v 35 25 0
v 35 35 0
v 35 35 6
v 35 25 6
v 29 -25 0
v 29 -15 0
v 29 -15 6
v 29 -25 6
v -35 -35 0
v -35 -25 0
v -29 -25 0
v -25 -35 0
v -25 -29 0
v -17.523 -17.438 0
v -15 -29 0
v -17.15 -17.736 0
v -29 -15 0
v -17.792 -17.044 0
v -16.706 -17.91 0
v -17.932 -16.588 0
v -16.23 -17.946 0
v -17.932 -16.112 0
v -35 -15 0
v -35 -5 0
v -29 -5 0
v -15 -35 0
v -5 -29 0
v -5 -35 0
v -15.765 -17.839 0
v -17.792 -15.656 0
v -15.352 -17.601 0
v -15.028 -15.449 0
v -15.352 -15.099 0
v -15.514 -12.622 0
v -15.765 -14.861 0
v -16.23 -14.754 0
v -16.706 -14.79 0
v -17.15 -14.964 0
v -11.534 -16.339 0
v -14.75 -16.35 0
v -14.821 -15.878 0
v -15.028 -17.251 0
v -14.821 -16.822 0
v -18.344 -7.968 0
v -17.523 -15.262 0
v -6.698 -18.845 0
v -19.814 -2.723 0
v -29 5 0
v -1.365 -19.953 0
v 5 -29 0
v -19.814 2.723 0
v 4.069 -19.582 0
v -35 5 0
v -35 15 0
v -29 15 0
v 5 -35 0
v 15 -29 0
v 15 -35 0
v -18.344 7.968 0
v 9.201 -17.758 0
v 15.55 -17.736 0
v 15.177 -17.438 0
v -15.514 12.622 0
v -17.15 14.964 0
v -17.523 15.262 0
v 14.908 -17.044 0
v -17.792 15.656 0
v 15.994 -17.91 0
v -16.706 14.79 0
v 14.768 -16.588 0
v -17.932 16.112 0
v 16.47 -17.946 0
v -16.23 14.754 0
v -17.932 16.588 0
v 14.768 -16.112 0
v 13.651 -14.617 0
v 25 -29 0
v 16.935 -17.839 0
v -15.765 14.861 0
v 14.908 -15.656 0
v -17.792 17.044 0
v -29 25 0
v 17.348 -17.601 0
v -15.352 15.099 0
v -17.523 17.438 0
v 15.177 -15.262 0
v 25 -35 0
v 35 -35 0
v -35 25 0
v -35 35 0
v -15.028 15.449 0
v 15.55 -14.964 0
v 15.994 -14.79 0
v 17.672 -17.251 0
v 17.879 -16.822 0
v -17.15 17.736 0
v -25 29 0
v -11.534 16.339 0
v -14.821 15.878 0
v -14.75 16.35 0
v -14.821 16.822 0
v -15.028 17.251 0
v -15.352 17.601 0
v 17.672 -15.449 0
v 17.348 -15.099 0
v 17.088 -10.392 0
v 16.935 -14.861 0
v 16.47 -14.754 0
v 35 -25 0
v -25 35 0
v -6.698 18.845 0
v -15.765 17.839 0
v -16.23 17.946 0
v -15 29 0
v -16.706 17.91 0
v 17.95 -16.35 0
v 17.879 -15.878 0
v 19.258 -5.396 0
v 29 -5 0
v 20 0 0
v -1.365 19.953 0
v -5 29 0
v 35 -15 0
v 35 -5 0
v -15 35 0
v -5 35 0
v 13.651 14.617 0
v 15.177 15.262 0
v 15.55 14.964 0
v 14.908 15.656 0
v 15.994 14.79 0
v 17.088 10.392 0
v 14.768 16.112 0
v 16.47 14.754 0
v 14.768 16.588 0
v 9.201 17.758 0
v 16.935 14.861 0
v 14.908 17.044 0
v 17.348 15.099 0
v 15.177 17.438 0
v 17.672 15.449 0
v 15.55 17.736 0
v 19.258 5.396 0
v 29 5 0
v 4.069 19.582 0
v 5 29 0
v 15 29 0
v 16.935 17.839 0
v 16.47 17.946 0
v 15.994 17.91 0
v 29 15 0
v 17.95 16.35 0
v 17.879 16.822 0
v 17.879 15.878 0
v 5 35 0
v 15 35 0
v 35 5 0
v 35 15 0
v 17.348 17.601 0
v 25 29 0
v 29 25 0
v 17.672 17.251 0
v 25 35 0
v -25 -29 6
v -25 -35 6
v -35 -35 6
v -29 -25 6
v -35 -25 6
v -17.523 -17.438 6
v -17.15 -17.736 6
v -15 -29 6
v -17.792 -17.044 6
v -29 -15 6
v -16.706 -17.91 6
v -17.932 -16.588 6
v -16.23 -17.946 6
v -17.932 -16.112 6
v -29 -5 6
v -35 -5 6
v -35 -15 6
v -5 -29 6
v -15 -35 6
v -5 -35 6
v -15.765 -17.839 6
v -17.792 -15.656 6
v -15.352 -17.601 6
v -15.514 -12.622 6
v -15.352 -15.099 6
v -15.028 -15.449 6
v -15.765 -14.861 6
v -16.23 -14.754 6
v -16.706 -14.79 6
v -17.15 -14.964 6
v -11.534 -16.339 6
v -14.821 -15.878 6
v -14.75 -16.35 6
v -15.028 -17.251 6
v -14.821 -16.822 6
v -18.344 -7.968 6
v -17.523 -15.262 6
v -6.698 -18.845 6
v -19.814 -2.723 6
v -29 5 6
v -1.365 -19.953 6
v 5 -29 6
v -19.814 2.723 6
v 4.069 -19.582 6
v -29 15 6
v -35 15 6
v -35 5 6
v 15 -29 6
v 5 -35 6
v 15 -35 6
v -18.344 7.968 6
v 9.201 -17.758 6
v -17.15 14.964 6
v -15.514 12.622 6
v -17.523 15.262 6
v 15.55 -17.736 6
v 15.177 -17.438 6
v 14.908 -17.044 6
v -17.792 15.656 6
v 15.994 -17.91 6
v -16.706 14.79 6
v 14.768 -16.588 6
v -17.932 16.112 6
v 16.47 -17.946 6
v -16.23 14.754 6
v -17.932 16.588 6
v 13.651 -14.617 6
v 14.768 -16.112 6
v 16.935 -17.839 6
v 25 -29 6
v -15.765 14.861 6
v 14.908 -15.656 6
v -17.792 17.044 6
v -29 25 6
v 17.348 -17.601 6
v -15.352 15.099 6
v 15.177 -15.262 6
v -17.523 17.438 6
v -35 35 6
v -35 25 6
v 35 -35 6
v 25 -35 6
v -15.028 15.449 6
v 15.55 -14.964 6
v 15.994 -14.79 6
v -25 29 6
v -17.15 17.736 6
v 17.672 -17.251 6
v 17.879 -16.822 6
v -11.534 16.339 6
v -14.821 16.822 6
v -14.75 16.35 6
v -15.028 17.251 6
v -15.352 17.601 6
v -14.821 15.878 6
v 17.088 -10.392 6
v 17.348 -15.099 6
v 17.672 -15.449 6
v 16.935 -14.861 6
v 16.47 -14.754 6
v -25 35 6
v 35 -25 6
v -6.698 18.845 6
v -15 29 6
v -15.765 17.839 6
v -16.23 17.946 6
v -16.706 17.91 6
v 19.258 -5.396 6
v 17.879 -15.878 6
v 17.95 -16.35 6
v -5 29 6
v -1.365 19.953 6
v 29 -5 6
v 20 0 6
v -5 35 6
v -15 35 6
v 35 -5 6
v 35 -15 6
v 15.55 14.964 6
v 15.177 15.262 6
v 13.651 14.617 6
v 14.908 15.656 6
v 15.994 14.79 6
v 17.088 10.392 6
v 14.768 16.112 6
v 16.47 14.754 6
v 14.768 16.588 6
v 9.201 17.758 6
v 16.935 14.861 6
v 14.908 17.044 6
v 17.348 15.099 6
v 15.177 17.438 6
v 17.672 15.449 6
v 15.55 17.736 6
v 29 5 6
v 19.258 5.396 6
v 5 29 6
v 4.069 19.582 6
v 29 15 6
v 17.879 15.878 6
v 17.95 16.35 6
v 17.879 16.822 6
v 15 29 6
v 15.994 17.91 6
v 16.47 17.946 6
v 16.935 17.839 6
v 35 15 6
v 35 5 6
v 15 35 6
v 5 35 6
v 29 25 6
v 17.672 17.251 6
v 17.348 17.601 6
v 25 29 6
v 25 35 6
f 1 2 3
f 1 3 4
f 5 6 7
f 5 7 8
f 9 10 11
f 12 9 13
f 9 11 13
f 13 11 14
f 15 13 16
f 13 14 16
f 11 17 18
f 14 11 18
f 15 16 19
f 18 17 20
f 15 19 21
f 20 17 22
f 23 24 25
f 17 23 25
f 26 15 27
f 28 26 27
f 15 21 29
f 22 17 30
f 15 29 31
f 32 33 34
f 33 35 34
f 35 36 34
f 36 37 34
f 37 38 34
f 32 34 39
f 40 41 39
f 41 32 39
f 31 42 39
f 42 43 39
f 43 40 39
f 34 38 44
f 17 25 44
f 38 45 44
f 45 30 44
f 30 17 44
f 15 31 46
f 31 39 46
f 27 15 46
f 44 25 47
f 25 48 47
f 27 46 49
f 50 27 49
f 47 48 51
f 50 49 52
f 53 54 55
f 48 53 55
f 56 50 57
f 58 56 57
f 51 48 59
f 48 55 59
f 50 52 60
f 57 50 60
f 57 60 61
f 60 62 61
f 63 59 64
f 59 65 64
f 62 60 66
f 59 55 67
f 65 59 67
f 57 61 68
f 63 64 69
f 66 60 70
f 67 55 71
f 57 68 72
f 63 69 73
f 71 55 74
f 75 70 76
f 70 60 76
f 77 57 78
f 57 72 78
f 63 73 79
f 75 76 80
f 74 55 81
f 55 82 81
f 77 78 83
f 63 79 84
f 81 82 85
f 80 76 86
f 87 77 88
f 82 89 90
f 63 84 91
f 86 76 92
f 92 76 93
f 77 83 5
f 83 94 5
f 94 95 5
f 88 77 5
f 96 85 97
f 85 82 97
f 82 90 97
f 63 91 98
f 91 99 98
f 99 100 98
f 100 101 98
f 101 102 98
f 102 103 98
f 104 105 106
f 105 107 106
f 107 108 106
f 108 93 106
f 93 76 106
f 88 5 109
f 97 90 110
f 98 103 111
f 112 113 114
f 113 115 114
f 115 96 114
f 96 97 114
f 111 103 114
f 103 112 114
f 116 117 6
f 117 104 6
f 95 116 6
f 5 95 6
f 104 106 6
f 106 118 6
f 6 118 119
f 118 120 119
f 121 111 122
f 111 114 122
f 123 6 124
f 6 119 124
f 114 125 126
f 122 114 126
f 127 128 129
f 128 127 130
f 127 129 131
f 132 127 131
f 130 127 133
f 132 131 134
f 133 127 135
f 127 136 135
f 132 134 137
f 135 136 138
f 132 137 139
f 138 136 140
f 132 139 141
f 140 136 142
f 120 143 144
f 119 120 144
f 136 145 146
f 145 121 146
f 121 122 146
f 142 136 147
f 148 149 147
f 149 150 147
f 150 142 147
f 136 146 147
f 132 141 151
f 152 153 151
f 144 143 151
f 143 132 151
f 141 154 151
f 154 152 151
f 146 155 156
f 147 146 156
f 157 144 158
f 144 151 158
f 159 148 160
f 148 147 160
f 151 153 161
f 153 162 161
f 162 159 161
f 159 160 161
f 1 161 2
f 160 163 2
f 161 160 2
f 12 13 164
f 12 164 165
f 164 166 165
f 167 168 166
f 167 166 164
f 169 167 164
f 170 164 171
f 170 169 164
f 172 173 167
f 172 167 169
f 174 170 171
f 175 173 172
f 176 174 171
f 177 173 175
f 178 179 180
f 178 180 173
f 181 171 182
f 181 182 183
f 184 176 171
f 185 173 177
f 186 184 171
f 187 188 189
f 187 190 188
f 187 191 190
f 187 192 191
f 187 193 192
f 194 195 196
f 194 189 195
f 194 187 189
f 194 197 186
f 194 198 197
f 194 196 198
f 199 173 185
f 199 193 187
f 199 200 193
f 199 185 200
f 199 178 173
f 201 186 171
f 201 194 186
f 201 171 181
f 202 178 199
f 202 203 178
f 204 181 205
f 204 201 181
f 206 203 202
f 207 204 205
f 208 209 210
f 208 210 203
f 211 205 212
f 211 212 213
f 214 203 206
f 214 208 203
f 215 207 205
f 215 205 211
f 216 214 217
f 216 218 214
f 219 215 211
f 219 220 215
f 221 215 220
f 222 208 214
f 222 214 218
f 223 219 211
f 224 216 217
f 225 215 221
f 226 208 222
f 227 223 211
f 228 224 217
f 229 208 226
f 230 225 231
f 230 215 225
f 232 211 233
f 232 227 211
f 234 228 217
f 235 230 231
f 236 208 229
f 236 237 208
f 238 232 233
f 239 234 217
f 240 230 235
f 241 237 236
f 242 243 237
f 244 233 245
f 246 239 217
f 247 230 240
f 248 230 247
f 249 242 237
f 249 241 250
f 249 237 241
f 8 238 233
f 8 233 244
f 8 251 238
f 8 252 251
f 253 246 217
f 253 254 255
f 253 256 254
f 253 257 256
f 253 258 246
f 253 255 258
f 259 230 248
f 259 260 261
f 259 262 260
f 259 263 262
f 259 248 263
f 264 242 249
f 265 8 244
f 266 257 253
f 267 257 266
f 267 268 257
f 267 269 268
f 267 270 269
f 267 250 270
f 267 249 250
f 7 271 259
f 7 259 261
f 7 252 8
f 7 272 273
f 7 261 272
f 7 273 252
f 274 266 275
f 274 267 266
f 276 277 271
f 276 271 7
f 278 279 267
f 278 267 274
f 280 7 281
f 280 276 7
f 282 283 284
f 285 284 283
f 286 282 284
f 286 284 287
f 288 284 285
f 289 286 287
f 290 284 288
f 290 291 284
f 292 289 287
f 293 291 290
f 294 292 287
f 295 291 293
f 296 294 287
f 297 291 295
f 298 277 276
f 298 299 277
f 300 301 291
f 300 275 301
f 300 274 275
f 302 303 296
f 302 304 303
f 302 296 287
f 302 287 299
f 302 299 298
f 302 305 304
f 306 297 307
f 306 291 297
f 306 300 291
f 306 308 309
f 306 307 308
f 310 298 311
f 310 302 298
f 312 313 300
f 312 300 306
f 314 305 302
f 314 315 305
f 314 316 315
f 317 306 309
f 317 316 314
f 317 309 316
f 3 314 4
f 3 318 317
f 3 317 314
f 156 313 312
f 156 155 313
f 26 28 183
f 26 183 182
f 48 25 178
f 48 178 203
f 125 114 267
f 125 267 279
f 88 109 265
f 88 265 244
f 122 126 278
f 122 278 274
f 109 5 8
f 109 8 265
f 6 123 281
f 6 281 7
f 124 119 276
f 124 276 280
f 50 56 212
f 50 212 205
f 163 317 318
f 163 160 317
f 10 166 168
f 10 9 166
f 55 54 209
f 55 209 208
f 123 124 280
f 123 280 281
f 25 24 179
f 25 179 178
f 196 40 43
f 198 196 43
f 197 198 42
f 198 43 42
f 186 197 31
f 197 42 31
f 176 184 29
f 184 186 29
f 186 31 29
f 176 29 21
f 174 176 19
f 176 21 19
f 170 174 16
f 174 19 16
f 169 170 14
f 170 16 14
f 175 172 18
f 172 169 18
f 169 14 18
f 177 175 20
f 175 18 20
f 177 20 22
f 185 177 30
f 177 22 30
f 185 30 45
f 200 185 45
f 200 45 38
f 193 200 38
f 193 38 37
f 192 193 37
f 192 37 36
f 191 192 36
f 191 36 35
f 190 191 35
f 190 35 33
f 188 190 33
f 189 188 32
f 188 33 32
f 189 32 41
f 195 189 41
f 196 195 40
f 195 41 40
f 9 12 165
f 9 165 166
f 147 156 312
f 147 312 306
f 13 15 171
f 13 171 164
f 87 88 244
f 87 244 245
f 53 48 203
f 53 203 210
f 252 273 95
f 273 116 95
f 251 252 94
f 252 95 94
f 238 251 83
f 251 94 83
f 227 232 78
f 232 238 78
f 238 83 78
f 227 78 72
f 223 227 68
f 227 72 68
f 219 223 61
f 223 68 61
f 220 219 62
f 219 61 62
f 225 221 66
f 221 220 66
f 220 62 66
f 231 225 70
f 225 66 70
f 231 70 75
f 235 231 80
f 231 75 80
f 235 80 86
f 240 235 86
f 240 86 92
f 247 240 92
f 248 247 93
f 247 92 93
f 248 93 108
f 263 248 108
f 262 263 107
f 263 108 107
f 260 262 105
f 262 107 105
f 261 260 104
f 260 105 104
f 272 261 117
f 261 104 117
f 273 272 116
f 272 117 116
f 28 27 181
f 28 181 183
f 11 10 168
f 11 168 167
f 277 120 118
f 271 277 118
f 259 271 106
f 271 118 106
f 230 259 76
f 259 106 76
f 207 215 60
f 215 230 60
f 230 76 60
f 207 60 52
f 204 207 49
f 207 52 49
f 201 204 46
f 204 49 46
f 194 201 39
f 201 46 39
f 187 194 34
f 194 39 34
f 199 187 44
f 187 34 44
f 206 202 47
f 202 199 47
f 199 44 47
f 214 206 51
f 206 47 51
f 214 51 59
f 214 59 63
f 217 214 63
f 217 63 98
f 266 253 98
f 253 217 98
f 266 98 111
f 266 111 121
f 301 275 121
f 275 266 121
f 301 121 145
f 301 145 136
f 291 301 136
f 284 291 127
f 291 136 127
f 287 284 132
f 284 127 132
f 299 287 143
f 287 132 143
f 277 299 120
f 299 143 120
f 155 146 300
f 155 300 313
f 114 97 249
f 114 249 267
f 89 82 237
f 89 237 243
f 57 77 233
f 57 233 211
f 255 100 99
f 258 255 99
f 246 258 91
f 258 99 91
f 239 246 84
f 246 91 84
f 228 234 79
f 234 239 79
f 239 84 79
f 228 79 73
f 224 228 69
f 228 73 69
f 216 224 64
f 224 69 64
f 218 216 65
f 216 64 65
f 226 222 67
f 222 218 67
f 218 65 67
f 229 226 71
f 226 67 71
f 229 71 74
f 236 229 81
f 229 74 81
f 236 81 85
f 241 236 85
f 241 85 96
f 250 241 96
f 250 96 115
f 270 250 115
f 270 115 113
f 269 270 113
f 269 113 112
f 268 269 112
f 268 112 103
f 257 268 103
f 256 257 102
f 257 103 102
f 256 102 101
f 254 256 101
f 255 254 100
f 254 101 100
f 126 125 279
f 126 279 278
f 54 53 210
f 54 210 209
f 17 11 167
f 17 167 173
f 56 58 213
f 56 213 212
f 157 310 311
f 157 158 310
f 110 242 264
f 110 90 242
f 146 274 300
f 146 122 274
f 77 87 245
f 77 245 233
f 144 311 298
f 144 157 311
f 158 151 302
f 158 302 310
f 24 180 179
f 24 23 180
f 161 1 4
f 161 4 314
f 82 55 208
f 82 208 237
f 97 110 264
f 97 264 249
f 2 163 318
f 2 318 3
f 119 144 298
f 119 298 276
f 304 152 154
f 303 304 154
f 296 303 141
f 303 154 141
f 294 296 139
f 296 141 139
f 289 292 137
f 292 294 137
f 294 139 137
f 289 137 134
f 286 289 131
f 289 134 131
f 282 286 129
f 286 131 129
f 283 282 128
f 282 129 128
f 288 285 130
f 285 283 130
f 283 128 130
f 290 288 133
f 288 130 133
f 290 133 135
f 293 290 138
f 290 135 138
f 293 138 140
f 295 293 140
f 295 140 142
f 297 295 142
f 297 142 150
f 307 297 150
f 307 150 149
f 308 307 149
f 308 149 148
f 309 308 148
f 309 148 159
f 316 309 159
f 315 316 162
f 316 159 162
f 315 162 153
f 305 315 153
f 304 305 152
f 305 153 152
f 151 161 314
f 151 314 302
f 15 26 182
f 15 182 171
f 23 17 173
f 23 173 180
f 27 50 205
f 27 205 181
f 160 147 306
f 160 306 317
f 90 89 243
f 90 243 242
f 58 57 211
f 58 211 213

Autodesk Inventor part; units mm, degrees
ref_plane "YZ Plane" through (0, 0, 0) normal (1, 0, 0) x (0, 1, 0)
ref_plane "XZ Plane" through (0, 0, 0) normal (0, 1, 0) x (-1, 0, 0)
ref_plane "XY Plane" through (0, 0, 0) normal (0, 0, 1) x (1, 0, 0)
sketch "Sketch1" plane through (0, 0, 0) normal (0, 0, 1) x (1, 0, 0)
  circle A0 centre (0, 0) radius 20
  line L0 (-35, 35) -> (35, 35)
  line L1 (35, 35) -> (35, -35)
  line L2 (35, -35) -> (-35, -35)
  line L3 (-35, -35) -> (-35, 35)
  line L4 (-35, 35) -> (35, -35) construction
  line L5 (35, 35) -> (-35, -35) construction
  circle A1 centre (-16.35, 16.35) radius 1.6
  circle A2 centre (16.35, 16.35) radius 1.6
  circle A3 centre (-16.35, -16.35) radius 1.6
  circle A4 centre (16.35, -16.35) radius 1.6
  line L6 (35, 5) -> (29, 5)
  line L7 (29, 5) -> (29, -5)
  line L8 (29, -5) -> (35, -5)
  line L9 (35, -5) -> (35, 5)
  line L10 (35, -15) -> (29, -15)
  line L11 (29, -25) -> (35, -25)
  line L12 (29, -15) -> (29, -25)
  line L13 (35, -25) -> (35, -15)
  line L14 (35, 25) -> (29, 25)
  line L15 (29, 15) -> (35, 15)
  line L16 (29, 25) -> (29, 15)
  line L17 (35, 15) -> (35, 25)
  line L18 (35, 5) -> (29, 5)
  line L19 (29, -5) -> (35, -5)
  line L20 (29, 5) -> (29, -5)
  line L21 (35, -5) -> (35, 5)
  line L22 (0, 35) -> (0, -35) construction
  line L23 (-35, 0) -> (35, 0) construction
  line L24 (5, 29) -> (5, 35)
  line L25 (5, 29) -> (5, 35)
  line L26 (-5, 29) -> (5, 29)
  line L27 (5, 35) -> (-5, 35)
  line L28 (15, 29) -> (25, 29)
  line L29 (25, 35) -> (15, 35)
  line L30 (-5, 35) -> (-5, 29)
  line L31 (-5, 35) -> (-5, 29)
  line L32 (25, 29) -> (25, 35)
  line L33 (-5, 29) -> (5, 29)
  line L34 (15, 35) -> (15, 29)
  line L35 (5, 35) -> (-5, 35)
  line L36 (-15, 29) -> (-15, 35)
  line L37 (-25, 35) -> (-25, 29)
  line L38 (-15, 35) -> (-25, 35)
  line L39 (-25, 29) -> (-15, 29)
  line L40 (-29, 5) -> (-35, 5)
  line L41 (-29, 5) -> (-35, 5)
  line L42 (-29, -5) -> (-29, 5)
  line L43 (-35, 5) -> (-35, -5)
  line L44 (-29, 15) -> (-29, 25)
  line L45 (-35, 25) -> (-35, 15)
  line L46 (-35, -5) -> (-29, -5)
  line L47 (-35, -5) -> (-29, -5)
  line L48 (-29, 25) -> (-35, 25)
  line L49 (-29, -5) -> (-29, 5)
  line L50 (-35, 15) -> (-29, 15)
  line L51 (-35, 5) -> (-35, -5)
  line L52 (-29, -15) -> (-35, -15)
  line L53 (-35, -25) -> (-29, -25)
  line L54 (-35, -15) -> (-35, -25)
  line L55 (-29, -25) -> (-29, -15)
  line L56 (-5, -29) -> (-5, -35)
  line L57 (-5, -29) -> (-5, -35)
  line L58 (5, -29) -> (-5, -29)
  line L59 (-5, -35) -> (5, -35)
  line L60 (-15, -29) -> (-25, -29)
  line L61 (-25, -35) -> (-15, -35)
  line L62 (5, -35) -> (5, -29)
  line L63 (5, -35) -> (5, -29)
  line L64 (-25, -29) -> (-25, -35)
  line L65 (5, -29) -> (-5, -29)
  line L66 (-15, -35) -> (-15, -29)
  line L67 (-5, -35) -> (5, -35)
  line L68 (15, -29) -> (15, -35)
  line L69 (25, -35) -> (25, -29)
  line L70 (15, -35) -> (25, -35)
  line L71 (25, -29) -> (15, -29)
  point P0 (29, 0)
  point P1 (29, -20)
  point P2 (35, -20)
  point P3 (29, 20)
  point P4 (35, 20)
  point P5 (29, 0)
  point P6 (0, 29)
  point P7 (20, 35)
  point P8 (20, 29)
  point P9 (0, 29)
  point P10 (0, 35)
  point P11 (0, 35)
  point P12 (-20, 29)
  point P13 (-20, 35)
  point P14 (-29, 0)
  point P15 (-35, 20)
  point P16 (-29, 20)
  point P17 (-29, 0)
  point P18 (-35, 0)
  point P19 (-35, 0)
  point P20 (-29, -20)
  point P21 (-35, -20)
  point P22 (0, -29)
  point P23 (-20, -35)
  point P24 (-20, -29)
  point P25 (0, -29)
  point P26 (0, -35)
  point P27 (0, -35)
  point P28 (20, -29)
  point P29 (20, -35)
  dimension "d0" = 40
  dimension "d1" = 70
  dimension "d2" = 70
  dimension "d3" = 32.7
  dimension "d4" = 3.2
  dimension "d5" = 6
  dimension "d6" = 10
  dimension "d9" = 20
  dimension "d12" = 20
  dimension "d17" = 360
extrude "Extrusion1" add sketch "Sketch1" along normal blind 6 contours L0 L37 L39 L36 L30 L26 L24 L34 L28 L32 L1 L14 L16 L15 L6 L7 L8 L10 L12 L11 L2 L69 L71 L68 L62 L58 L56 L66 L60 L64 L3 L53 L55 L52 L46 L42 L40 L50 L44 L48
equation "\"d9\" = 2 * d6"
equation "\"d12\" = 2 * d6"
equation "\"BendRadius\" = Thickness"
equation "\"BendReliefWidth\" = Thickness"
equation "\"BendReliefDepth\" = 0.5 * Thickness"
equation "\"CornerReliefSize\" = 4 * Thickness"
equation "\"MinimumRemnant\" = 2 * Thickness"
equation "\"TransitionRadius\" = BendRadius"
equation "\"JacobiRadiusSize\" = Thickness"
equation "\"GapSize\" = Thickness"
equation "\"Thickness\" = 0.5"
properties part number "joystick behuizing boevnzijde" material "Wood (Birch)"
